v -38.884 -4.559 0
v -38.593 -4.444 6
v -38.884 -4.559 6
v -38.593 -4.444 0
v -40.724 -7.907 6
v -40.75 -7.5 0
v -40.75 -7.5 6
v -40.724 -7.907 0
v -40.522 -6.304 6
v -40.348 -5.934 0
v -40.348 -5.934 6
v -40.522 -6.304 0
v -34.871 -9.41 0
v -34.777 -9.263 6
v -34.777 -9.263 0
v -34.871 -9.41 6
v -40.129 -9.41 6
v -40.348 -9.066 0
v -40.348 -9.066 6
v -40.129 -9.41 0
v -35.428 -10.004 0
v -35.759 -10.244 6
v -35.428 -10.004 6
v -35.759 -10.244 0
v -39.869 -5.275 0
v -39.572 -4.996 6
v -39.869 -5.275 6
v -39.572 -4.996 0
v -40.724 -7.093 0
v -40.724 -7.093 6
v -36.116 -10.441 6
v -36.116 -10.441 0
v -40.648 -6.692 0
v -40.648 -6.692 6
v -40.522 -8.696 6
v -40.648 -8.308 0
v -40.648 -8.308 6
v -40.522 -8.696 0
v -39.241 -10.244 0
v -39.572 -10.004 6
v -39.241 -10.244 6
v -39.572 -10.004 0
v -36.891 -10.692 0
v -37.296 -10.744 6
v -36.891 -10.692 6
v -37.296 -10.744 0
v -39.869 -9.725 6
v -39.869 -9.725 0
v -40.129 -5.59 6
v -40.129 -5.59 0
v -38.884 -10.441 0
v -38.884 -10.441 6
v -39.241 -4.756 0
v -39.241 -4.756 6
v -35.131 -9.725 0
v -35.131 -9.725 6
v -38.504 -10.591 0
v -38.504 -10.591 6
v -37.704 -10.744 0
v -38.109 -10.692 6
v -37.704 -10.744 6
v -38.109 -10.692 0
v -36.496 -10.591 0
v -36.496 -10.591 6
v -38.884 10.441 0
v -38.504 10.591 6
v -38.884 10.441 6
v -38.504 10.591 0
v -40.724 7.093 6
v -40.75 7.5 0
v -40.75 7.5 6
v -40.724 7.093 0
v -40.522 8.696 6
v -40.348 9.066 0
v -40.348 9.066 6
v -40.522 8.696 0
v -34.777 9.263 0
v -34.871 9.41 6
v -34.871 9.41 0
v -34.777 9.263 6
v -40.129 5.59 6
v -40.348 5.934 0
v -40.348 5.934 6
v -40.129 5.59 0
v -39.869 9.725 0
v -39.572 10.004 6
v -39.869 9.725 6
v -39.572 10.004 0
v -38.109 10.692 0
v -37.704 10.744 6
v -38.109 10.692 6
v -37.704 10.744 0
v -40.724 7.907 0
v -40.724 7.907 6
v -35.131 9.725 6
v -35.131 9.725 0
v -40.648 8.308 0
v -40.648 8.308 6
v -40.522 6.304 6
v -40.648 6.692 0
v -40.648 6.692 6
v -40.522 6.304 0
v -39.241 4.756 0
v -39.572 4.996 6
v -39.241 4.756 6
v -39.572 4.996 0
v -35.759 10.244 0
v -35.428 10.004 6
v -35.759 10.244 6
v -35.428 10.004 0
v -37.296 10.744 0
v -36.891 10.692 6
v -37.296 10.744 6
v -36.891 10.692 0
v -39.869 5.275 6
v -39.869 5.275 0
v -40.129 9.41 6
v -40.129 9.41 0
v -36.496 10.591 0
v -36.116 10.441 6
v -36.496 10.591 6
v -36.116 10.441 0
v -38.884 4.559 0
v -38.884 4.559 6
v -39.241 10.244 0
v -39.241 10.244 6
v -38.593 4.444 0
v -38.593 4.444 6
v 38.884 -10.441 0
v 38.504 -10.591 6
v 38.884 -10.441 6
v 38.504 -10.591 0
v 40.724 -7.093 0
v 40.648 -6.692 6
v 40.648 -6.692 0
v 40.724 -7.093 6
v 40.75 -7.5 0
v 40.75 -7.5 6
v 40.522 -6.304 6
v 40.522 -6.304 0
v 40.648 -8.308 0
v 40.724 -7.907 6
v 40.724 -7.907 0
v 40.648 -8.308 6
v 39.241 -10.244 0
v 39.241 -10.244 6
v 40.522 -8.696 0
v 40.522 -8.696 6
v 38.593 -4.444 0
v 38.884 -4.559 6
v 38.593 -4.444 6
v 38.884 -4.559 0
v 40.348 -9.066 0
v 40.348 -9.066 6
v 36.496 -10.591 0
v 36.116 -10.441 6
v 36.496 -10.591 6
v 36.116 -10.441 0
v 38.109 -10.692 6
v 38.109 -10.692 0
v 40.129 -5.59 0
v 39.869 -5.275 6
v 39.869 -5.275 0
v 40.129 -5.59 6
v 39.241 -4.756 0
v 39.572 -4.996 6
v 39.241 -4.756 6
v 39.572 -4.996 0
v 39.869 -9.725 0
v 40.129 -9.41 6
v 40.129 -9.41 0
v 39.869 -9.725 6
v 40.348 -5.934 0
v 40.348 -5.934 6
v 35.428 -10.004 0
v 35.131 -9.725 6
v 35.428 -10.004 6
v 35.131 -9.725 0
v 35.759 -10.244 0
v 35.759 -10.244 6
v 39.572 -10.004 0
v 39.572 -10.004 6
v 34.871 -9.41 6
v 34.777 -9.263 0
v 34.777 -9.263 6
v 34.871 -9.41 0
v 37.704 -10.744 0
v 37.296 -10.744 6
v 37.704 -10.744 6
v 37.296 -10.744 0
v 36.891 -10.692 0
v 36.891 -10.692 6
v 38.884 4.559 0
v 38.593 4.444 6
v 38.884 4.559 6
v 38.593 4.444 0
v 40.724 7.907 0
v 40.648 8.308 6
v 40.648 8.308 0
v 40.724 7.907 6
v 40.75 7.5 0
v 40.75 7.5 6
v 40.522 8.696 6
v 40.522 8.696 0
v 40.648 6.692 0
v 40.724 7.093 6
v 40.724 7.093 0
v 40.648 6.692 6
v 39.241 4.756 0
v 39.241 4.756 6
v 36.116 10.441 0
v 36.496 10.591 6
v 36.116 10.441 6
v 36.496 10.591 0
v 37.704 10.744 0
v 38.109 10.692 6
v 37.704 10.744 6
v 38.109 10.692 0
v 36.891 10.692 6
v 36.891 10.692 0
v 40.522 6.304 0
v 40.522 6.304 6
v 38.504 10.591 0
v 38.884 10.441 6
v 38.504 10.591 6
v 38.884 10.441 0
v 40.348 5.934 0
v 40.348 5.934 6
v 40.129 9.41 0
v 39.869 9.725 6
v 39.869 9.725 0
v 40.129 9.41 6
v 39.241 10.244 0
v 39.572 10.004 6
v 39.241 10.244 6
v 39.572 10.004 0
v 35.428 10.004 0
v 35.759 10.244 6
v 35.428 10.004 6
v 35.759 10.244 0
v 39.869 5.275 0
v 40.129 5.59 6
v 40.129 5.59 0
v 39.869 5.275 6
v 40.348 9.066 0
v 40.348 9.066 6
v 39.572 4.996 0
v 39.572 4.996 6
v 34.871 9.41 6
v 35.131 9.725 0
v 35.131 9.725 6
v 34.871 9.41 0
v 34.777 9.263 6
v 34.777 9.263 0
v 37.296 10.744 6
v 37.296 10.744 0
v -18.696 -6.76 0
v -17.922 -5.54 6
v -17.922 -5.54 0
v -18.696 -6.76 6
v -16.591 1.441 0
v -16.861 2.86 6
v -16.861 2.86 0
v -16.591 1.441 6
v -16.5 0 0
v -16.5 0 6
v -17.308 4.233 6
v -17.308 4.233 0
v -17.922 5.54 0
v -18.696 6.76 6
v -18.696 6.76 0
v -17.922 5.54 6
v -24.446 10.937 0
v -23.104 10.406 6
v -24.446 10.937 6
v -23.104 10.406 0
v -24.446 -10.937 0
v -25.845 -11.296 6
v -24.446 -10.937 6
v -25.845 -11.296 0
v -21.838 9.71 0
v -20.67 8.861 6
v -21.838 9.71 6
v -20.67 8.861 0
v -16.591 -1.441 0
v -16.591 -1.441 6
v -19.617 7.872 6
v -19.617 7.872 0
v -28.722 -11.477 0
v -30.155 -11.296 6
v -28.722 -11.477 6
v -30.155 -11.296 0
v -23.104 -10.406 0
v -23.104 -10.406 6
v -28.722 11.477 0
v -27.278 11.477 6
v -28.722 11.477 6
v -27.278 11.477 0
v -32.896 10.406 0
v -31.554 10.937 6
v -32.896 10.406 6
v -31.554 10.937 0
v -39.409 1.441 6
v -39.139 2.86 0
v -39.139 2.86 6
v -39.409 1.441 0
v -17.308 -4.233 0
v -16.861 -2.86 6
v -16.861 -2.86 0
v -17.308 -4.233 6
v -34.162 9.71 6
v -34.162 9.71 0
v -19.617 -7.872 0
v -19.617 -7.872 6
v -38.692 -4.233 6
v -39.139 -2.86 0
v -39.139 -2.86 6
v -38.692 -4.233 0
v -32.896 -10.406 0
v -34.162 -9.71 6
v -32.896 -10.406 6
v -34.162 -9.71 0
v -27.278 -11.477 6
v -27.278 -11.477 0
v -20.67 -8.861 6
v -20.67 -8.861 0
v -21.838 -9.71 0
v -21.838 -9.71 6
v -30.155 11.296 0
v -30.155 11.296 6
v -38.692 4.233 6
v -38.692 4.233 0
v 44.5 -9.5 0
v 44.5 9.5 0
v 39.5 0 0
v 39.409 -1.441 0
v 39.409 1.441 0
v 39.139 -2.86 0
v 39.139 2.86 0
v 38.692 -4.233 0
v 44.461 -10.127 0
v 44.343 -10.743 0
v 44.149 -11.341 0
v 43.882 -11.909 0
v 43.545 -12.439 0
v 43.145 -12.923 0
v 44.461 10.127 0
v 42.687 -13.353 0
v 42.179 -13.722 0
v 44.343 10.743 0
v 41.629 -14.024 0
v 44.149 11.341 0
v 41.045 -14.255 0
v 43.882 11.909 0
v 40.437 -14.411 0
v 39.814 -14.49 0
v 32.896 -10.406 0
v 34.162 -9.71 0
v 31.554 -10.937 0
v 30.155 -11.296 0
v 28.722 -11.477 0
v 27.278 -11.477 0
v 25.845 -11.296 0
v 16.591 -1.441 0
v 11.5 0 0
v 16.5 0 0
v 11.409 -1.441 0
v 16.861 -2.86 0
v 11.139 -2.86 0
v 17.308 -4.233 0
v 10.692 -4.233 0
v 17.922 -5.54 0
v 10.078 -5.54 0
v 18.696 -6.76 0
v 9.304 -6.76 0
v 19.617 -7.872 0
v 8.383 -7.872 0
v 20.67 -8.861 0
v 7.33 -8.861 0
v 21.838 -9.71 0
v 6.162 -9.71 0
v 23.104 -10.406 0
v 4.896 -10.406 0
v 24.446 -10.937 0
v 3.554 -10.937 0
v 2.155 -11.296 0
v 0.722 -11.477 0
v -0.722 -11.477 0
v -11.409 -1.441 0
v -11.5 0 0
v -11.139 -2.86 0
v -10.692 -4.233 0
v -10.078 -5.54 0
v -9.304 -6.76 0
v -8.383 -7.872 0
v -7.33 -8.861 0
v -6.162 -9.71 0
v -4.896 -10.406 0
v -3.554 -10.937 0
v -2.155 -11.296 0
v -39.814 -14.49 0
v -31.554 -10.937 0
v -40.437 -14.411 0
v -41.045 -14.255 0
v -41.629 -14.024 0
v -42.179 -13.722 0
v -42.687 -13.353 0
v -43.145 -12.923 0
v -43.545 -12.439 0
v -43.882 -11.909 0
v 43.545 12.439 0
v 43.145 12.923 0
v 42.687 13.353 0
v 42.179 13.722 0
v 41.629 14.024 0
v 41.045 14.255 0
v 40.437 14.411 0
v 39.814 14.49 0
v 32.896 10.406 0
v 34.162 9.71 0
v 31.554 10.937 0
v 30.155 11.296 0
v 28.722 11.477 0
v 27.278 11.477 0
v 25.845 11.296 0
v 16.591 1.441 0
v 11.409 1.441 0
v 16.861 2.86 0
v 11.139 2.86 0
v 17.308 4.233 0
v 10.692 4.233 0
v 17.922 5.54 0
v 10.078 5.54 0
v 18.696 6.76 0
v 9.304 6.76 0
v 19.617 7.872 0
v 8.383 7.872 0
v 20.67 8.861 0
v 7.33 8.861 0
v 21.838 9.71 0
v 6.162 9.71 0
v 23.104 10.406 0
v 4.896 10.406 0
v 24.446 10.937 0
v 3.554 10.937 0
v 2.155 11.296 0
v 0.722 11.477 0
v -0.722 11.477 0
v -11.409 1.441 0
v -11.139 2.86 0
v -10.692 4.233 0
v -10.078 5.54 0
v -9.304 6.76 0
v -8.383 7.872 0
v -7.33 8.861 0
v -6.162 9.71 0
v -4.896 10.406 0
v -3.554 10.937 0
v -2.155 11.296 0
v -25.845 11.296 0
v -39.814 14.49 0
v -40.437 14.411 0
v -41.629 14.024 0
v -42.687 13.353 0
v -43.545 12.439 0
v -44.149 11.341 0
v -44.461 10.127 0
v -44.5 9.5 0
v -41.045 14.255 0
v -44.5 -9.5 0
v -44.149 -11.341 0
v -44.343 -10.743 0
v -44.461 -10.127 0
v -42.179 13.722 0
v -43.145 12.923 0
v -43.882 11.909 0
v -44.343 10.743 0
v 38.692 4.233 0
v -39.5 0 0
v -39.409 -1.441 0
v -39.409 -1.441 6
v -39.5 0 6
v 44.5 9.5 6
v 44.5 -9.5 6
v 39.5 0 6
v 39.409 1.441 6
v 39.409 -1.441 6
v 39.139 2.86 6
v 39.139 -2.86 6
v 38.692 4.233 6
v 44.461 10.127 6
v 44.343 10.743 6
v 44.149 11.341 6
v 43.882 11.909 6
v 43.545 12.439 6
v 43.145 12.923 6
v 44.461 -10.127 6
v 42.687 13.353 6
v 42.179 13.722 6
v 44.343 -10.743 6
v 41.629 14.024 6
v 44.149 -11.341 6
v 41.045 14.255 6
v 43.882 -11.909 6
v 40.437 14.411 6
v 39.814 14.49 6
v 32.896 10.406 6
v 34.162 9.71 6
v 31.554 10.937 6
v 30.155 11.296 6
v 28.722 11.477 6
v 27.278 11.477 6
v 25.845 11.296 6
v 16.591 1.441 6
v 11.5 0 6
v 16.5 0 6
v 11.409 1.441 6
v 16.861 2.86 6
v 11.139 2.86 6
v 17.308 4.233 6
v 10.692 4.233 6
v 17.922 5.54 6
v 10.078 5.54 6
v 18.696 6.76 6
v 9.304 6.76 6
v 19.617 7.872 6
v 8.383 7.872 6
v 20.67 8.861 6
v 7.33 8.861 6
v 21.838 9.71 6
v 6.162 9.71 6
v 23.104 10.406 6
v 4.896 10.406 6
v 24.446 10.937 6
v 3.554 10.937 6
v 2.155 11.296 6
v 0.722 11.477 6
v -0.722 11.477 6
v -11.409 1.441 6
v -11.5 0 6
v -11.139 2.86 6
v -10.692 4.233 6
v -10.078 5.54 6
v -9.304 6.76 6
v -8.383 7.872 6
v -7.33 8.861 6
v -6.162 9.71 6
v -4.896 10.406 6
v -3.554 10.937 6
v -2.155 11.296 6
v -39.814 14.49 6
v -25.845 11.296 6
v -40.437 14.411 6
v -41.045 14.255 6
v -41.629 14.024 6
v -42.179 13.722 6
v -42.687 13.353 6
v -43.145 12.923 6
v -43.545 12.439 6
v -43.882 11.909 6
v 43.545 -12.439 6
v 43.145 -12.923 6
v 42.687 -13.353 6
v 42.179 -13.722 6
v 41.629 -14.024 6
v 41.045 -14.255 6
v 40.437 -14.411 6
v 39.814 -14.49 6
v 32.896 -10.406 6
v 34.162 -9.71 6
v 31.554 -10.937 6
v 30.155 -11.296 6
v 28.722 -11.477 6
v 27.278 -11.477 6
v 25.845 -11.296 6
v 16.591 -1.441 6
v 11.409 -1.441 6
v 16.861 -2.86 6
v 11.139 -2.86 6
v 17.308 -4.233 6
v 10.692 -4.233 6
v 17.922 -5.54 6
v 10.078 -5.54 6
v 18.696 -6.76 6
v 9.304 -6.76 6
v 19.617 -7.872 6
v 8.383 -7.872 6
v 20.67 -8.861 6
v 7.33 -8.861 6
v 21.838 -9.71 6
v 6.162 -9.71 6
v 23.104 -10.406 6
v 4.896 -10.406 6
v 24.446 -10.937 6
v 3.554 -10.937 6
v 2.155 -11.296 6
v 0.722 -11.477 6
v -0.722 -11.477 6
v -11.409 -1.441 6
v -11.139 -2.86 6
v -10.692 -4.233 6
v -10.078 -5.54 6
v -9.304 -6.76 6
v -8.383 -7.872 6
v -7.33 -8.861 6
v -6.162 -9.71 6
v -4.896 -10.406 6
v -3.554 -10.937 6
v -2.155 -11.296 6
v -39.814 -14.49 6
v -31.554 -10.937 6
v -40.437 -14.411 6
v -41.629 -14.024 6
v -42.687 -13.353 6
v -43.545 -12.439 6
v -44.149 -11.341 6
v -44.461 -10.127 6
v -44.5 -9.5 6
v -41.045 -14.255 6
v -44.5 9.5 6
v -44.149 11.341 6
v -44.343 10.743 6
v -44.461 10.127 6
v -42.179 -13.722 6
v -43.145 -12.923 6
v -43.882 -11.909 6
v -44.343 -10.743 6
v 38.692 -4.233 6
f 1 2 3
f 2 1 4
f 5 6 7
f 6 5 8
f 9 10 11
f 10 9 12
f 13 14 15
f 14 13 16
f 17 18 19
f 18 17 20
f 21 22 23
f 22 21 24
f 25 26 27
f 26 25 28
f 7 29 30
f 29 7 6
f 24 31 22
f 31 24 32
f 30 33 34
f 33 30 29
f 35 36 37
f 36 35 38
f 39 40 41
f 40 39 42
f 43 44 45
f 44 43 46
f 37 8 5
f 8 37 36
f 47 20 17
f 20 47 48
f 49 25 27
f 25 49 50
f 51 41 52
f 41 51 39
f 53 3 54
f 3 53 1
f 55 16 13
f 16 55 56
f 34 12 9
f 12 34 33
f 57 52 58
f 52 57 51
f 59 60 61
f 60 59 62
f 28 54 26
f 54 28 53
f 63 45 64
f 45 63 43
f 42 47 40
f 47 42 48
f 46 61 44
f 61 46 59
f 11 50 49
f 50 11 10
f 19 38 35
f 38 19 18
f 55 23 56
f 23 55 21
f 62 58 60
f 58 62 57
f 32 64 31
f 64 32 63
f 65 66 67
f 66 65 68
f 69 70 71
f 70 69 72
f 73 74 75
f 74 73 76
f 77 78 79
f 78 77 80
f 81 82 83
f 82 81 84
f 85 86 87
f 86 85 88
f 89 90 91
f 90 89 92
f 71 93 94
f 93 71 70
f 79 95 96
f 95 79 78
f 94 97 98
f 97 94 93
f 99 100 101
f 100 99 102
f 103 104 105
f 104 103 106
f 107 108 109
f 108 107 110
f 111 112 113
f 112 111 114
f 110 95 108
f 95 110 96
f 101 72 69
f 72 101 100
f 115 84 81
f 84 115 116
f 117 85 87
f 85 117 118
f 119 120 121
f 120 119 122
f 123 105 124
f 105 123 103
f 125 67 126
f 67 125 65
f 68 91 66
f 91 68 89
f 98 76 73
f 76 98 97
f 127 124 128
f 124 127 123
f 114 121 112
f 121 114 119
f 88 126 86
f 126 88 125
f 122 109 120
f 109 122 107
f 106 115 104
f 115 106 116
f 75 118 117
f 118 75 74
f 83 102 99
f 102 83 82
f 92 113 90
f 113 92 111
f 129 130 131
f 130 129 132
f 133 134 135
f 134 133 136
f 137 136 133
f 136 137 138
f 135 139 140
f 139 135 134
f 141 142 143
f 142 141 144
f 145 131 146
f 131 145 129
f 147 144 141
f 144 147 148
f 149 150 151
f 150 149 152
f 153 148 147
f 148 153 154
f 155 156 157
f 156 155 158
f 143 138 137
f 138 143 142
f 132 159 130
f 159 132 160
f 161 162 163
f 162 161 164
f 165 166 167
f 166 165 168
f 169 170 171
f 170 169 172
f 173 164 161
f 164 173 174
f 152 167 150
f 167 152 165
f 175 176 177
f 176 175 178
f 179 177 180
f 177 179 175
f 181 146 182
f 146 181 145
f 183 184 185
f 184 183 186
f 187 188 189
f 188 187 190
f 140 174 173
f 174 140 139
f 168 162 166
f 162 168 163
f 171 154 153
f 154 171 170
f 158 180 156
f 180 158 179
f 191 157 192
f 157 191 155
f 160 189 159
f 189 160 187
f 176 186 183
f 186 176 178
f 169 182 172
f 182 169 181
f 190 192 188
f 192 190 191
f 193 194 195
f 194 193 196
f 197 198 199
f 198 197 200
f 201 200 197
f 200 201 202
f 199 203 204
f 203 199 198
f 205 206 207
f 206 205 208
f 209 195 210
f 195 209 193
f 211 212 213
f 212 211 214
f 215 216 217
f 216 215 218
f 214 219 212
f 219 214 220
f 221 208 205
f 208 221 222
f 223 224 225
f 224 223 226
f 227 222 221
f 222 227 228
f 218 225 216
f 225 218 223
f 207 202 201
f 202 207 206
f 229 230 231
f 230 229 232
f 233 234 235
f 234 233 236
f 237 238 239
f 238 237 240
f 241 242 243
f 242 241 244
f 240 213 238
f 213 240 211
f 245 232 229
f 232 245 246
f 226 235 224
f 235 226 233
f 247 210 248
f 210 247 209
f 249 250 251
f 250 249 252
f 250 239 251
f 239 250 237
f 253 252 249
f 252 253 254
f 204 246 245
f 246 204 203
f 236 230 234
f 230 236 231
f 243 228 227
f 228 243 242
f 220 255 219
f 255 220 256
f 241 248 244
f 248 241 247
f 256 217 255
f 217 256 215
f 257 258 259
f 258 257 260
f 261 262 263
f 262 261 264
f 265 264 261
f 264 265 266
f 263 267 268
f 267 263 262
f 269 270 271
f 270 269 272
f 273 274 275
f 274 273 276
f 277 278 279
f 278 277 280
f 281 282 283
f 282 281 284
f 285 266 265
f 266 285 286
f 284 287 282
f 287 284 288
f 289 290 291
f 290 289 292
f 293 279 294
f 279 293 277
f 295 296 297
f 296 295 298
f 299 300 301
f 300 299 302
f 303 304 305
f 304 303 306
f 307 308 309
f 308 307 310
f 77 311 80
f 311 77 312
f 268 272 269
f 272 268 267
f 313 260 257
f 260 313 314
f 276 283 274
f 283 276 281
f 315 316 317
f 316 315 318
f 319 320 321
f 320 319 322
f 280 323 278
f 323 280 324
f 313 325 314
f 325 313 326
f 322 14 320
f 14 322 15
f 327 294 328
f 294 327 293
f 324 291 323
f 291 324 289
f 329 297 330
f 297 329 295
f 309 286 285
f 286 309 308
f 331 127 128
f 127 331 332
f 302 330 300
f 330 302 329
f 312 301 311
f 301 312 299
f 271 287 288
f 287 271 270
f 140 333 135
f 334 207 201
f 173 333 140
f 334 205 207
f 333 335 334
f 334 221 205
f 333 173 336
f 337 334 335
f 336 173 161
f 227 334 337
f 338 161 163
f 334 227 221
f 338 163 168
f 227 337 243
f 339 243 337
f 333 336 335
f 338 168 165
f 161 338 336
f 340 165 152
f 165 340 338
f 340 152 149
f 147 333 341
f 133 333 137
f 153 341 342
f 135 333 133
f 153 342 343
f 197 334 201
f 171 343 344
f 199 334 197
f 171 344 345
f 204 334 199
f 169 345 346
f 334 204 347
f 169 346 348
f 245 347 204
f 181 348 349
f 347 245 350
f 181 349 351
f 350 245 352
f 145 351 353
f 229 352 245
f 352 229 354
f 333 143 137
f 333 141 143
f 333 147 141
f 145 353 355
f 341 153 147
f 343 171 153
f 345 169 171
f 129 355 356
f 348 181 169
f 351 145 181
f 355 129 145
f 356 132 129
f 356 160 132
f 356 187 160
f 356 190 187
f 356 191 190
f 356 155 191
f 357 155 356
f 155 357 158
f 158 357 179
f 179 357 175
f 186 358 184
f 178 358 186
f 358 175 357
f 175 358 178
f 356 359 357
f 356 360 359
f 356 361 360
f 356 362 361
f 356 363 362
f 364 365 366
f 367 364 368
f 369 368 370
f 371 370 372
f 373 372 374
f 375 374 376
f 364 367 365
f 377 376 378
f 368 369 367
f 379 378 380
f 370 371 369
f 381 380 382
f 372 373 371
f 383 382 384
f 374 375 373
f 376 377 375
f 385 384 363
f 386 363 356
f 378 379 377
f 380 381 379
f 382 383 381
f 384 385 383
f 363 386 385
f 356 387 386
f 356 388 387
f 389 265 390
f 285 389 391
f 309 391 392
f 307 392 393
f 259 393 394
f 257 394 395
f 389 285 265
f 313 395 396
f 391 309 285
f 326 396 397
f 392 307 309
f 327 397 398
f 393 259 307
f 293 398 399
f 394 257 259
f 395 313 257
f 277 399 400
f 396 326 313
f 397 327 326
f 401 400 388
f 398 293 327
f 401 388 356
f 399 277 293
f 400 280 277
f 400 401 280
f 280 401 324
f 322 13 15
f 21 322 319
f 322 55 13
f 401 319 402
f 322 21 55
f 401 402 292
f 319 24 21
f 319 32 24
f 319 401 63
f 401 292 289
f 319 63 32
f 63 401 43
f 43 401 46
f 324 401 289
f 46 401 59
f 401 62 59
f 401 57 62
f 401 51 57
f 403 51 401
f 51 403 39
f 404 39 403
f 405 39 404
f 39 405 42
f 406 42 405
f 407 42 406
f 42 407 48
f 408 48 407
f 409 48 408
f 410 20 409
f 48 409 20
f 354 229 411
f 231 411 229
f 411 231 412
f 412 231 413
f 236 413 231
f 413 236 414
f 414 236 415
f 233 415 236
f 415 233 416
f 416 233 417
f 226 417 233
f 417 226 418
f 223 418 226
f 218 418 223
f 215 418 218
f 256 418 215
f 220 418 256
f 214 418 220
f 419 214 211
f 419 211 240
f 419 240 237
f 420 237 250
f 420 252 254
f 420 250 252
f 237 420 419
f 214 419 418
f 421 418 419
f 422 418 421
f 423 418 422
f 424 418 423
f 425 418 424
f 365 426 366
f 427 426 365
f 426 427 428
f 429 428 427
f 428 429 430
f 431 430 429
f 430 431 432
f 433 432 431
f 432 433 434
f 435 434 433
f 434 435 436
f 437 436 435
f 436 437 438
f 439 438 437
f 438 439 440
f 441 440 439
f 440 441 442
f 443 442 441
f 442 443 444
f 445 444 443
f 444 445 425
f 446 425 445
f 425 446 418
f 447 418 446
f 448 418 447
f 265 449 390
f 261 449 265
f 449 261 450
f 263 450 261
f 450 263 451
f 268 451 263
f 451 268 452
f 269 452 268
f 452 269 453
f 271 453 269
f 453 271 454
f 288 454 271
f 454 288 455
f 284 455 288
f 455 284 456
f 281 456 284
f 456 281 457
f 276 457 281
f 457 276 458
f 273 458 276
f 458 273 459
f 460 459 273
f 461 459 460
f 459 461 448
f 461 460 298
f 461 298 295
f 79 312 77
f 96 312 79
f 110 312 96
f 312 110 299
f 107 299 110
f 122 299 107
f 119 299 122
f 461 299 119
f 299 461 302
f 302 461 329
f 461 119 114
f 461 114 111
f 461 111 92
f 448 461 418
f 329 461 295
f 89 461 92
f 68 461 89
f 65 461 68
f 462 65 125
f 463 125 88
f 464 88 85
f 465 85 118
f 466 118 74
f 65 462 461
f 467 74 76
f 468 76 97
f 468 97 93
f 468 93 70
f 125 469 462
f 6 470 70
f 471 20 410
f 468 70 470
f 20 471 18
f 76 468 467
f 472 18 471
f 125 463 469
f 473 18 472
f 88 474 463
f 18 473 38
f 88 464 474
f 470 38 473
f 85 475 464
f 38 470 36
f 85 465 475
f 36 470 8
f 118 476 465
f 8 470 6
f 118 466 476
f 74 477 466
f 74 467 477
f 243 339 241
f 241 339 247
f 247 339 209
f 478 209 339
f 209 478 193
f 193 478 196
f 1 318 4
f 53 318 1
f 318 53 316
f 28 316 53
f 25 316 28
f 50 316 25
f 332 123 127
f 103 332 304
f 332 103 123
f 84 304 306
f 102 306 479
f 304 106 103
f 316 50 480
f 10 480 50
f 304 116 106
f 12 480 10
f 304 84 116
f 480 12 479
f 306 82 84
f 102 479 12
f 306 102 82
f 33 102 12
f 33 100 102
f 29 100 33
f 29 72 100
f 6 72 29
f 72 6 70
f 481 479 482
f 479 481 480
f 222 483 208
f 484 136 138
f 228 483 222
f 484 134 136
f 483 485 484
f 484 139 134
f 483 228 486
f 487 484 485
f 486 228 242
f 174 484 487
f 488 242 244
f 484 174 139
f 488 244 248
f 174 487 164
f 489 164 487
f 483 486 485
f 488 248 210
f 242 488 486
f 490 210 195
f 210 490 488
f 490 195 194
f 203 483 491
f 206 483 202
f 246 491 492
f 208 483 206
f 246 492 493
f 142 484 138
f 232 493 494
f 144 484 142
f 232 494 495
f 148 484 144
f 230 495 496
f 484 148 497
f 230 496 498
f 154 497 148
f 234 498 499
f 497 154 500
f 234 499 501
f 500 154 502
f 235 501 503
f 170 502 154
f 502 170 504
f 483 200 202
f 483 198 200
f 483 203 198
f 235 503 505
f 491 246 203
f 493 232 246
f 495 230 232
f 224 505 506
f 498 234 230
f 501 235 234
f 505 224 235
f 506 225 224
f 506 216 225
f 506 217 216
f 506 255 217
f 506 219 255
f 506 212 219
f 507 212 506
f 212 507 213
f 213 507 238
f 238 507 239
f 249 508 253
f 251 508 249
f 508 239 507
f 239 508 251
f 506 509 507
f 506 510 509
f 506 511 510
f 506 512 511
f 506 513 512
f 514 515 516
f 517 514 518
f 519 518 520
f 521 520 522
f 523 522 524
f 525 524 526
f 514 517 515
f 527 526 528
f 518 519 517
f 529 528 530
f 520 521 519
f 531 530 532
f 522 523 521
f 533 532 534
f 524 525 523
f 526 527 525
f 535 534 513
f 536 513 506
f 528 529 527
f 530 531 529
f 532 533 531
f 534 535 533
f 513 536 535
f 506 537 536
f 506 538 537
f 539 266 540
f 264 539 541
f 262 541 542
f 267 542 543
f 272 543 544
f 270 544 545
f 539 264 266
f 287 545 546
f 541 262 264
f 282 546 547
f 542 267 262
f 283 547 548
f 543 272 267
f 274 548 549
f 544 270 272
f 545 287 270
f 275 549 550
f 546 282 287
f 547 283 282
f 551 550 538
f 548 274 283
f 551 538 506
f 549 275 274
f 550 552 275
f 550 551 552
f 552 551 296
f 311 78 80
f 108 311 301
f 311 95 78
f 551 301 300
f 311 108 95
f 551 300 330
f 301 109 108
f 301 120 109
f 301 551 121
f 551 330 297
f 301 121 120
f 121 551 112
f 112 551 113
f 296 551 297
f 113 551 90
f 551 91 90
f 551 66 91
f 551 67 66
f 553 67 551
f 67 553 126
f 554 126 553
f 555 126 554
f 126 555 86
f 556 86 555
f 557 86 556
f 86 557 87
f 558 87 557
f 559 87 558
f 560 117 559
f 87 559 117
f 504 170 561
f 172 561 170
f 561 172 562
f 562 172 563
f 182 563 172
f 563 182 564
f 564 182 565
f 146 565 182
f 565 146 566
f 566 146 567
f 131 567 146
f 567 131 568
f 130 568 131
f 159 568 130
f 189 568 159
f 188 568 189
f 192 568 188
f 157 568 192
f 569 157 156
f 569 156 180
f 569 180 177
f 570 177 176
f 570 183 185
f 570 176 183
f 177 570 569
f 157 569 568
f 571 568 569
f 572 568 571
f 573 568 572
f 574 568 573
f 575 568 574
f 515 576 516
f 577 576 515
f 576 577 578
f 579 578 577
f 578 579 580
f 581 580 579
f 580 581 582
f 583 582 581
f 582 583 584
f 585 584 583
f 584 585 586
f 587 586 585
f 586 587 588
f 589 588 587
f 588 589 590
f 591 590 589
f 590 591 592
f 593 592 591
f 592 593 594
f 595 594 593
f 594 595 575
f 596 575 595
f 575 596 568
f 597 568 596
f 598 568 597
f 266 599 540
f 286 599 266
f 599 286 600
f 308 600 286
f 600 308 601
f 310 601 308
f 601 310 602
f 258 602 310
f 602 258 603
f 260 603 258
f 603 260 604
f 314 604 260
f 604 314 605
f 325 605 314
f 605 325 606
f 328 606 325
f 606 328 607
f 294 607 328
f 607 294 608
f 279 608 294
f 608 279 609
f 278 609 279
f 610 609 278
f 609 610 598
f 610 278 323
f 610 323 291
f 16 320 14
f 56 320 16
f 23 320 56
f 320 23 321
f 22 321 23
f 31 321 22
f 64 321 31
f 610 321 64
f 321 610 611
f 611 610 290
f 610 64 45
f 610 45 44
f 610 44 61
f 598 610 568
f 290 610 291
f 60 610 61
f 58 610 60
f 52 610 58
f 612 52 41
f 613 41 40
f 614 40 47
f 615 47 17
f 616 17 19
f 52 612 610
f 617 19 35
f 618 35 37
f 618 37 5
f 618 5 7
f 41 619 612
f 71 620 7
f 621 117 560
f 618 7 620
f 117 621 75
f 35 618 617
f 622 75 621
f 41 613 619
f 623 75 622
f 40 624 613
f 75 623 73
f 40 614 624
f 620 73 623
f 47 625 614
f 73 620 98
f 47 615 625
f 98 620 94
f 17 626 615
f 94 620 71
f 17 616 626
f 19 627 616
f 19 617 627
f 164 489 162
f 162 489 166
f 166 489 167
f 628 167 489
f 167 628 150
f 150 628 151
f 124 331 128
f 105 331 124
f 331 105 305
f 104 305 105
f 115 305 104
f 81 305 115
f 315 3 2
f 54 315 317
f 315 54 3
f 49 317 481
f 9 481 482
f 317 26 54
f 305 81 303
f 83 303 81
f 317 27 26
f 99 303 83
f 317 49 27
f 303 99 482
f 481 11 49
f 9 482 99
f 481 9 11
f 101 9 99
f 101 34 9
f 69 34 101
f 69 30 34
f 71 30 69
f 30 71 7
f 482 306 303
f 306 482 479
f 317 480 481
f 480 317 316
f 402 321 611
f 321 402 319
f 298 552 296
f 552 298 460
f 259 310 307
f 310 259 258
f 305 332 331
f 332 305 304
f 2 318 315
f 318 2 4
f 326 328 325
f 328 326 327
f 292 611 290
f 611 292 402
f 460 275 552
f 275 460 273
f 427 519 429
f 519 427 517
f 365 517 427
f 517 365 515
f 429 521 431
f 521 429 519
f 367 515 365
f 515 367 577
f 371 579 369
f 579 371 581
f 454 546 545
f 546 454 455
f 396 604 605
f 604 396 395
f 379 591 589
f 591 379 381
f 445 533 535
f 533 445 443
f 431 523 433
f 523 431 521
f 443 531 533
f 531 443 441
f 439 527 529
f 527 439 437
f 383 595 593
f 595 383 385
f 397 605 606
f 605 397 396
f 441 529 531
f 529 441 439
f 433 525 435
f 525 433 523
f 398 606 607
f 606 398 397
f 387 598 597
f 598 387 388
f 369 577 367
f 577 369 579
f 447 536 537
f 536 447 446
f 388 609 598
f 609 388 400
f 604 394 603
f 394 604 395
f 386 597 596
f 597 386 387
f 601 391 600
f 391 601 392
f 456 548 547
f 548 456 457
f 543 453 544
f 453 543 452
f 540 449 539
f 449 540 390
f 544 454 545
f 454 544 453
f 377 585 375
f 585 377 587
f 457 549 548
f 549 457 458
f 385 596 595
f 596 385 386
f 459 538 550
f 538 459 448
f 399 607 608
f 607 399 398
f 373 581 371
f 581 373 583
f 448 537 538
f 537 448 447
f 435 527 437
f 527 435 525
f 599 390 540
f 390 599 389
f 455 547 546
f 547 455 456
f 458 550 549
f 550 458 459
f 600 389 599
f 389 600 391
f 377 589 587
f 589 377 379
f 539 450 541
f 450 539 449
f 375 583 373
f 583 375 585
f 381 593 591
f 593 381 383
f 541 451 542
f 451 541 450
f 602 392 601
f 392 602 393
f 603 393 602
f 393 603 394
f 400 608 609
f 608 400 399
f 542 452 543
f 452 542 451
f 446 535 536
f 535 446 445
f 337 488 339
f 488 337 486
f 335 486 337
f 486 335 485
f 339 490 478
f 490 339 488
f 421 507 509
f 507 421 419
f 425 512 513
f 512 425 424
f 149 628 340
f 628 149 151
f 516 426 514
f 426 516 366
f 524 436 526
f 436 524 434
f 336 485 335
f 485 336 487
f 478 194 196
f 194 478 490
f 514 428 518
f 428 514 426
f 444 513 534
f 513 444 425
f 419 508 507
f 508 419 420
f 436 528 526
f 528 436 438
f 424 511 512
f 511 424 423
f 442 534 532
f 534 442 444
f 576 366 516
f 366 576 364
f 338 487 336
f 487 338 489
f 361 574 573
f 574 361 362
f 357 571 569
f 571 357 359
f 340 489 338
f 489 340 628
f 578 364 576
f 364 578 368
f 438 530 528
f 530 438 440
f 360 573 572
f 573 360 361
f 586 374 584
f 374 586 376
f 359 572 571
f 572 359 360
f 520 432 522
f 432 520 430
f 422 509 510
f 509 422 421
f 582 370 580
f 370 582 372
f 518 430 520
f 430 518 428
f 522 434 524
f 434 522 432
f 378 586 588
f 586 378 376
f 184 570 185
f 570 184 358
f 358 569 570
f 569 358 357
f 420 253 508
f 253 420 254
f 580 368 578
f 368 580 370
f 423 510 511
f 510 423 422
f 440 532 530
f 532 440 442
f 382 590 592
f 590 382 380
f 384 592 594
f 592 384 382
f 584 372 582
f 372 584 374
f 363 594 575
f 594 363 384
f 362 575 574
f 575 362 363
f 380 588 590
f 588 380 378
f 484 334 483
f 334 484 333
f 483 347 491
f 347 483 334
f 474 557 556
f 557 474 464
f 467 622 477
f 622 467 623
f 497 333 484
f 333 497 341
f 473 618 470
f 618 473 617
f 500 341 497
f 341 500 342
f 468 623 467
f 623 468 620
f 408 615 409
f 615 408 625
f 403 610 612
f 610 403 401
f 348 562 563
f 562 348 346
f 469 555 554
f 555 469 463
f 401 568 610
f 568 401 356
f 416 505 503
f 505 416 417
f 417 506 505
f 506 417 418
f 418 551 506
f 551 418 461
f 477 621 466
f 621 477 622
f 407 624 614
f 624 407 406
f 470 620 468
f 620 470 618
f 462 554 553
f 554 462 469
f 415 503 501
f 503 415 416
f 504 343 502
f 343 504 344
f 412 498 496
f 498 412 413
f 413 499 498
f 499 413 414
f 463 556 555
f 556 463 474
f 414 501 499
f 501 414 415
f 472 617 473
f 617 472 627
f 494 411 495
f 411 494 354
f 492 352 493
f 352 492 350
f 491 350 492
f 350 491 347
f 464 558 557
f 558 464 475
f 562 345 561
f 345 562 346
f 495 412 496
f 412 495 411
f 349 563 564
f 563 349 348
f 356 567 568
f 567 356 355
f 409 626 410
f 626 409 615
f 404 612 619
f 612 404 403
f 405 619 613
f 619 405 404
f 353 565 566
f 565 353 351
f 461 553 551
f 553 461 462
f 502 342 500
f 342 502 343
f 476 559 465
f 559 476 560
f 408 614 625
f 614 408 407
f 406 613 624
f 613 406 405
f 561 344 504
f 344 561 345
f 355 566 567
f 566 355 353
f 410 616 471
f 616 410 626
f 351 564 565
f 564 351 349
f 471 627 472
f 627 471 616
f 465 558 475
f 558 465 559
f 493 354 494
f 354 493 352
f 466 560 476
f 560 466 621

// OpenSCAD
$fn = 50;


difference() {
	union() {
		hull() {
			translate(v = [-39.5000000000, 9.5000000000, 0]) {
				cylinder(h = 6, r = 5);
			}
			translate(v = [39.5000000000, 9.5000000000, 0]) {
				cylinder(h = 6, r = 5);
			}
			translate(v = [-39.5000000000, -9.5000000000, 0]) {
				cylinder(h = 6, r = 5);
			}
			translate(v = [39.5000000000, -9.5000000000, 0]) {
				cylinder(h = 6, r = 5);
			}
		}
	}
	union() {
		#translate(v = [-37.5000000000, -7.5000000000, -100.0000000000]) {
			cylinder(h = 200, r = 3.2500000000);
		}
		#translate(v = [-37.5000000000, 7.5000000000, -100.0000000000]) {
			cylinder(h = 200, r = 3.2500000000);
		}
		#translate(v = [37.5000000000, -7.5000000000, -100.0000000000]) {
			cylinder(h = 200, r = 3.2500000000);
		}
		#translate(v = [37.5000000000, 7.5000000000, -100.0000000000]) {
			cylinder(h = 200, r = 3.2500000000);
		}
		#translate(v = [-28.0000000000, 0, 0]) {
			cylinder(h = 6, r = 11.5000000000);
		}
		#cylinder(h = 6, r = 11.5000000000);
		#translate(v = [28.0000000000, 0, 0]) {
			cylinder(h = 6, r = 11.5000000000);
		}
	}
}
